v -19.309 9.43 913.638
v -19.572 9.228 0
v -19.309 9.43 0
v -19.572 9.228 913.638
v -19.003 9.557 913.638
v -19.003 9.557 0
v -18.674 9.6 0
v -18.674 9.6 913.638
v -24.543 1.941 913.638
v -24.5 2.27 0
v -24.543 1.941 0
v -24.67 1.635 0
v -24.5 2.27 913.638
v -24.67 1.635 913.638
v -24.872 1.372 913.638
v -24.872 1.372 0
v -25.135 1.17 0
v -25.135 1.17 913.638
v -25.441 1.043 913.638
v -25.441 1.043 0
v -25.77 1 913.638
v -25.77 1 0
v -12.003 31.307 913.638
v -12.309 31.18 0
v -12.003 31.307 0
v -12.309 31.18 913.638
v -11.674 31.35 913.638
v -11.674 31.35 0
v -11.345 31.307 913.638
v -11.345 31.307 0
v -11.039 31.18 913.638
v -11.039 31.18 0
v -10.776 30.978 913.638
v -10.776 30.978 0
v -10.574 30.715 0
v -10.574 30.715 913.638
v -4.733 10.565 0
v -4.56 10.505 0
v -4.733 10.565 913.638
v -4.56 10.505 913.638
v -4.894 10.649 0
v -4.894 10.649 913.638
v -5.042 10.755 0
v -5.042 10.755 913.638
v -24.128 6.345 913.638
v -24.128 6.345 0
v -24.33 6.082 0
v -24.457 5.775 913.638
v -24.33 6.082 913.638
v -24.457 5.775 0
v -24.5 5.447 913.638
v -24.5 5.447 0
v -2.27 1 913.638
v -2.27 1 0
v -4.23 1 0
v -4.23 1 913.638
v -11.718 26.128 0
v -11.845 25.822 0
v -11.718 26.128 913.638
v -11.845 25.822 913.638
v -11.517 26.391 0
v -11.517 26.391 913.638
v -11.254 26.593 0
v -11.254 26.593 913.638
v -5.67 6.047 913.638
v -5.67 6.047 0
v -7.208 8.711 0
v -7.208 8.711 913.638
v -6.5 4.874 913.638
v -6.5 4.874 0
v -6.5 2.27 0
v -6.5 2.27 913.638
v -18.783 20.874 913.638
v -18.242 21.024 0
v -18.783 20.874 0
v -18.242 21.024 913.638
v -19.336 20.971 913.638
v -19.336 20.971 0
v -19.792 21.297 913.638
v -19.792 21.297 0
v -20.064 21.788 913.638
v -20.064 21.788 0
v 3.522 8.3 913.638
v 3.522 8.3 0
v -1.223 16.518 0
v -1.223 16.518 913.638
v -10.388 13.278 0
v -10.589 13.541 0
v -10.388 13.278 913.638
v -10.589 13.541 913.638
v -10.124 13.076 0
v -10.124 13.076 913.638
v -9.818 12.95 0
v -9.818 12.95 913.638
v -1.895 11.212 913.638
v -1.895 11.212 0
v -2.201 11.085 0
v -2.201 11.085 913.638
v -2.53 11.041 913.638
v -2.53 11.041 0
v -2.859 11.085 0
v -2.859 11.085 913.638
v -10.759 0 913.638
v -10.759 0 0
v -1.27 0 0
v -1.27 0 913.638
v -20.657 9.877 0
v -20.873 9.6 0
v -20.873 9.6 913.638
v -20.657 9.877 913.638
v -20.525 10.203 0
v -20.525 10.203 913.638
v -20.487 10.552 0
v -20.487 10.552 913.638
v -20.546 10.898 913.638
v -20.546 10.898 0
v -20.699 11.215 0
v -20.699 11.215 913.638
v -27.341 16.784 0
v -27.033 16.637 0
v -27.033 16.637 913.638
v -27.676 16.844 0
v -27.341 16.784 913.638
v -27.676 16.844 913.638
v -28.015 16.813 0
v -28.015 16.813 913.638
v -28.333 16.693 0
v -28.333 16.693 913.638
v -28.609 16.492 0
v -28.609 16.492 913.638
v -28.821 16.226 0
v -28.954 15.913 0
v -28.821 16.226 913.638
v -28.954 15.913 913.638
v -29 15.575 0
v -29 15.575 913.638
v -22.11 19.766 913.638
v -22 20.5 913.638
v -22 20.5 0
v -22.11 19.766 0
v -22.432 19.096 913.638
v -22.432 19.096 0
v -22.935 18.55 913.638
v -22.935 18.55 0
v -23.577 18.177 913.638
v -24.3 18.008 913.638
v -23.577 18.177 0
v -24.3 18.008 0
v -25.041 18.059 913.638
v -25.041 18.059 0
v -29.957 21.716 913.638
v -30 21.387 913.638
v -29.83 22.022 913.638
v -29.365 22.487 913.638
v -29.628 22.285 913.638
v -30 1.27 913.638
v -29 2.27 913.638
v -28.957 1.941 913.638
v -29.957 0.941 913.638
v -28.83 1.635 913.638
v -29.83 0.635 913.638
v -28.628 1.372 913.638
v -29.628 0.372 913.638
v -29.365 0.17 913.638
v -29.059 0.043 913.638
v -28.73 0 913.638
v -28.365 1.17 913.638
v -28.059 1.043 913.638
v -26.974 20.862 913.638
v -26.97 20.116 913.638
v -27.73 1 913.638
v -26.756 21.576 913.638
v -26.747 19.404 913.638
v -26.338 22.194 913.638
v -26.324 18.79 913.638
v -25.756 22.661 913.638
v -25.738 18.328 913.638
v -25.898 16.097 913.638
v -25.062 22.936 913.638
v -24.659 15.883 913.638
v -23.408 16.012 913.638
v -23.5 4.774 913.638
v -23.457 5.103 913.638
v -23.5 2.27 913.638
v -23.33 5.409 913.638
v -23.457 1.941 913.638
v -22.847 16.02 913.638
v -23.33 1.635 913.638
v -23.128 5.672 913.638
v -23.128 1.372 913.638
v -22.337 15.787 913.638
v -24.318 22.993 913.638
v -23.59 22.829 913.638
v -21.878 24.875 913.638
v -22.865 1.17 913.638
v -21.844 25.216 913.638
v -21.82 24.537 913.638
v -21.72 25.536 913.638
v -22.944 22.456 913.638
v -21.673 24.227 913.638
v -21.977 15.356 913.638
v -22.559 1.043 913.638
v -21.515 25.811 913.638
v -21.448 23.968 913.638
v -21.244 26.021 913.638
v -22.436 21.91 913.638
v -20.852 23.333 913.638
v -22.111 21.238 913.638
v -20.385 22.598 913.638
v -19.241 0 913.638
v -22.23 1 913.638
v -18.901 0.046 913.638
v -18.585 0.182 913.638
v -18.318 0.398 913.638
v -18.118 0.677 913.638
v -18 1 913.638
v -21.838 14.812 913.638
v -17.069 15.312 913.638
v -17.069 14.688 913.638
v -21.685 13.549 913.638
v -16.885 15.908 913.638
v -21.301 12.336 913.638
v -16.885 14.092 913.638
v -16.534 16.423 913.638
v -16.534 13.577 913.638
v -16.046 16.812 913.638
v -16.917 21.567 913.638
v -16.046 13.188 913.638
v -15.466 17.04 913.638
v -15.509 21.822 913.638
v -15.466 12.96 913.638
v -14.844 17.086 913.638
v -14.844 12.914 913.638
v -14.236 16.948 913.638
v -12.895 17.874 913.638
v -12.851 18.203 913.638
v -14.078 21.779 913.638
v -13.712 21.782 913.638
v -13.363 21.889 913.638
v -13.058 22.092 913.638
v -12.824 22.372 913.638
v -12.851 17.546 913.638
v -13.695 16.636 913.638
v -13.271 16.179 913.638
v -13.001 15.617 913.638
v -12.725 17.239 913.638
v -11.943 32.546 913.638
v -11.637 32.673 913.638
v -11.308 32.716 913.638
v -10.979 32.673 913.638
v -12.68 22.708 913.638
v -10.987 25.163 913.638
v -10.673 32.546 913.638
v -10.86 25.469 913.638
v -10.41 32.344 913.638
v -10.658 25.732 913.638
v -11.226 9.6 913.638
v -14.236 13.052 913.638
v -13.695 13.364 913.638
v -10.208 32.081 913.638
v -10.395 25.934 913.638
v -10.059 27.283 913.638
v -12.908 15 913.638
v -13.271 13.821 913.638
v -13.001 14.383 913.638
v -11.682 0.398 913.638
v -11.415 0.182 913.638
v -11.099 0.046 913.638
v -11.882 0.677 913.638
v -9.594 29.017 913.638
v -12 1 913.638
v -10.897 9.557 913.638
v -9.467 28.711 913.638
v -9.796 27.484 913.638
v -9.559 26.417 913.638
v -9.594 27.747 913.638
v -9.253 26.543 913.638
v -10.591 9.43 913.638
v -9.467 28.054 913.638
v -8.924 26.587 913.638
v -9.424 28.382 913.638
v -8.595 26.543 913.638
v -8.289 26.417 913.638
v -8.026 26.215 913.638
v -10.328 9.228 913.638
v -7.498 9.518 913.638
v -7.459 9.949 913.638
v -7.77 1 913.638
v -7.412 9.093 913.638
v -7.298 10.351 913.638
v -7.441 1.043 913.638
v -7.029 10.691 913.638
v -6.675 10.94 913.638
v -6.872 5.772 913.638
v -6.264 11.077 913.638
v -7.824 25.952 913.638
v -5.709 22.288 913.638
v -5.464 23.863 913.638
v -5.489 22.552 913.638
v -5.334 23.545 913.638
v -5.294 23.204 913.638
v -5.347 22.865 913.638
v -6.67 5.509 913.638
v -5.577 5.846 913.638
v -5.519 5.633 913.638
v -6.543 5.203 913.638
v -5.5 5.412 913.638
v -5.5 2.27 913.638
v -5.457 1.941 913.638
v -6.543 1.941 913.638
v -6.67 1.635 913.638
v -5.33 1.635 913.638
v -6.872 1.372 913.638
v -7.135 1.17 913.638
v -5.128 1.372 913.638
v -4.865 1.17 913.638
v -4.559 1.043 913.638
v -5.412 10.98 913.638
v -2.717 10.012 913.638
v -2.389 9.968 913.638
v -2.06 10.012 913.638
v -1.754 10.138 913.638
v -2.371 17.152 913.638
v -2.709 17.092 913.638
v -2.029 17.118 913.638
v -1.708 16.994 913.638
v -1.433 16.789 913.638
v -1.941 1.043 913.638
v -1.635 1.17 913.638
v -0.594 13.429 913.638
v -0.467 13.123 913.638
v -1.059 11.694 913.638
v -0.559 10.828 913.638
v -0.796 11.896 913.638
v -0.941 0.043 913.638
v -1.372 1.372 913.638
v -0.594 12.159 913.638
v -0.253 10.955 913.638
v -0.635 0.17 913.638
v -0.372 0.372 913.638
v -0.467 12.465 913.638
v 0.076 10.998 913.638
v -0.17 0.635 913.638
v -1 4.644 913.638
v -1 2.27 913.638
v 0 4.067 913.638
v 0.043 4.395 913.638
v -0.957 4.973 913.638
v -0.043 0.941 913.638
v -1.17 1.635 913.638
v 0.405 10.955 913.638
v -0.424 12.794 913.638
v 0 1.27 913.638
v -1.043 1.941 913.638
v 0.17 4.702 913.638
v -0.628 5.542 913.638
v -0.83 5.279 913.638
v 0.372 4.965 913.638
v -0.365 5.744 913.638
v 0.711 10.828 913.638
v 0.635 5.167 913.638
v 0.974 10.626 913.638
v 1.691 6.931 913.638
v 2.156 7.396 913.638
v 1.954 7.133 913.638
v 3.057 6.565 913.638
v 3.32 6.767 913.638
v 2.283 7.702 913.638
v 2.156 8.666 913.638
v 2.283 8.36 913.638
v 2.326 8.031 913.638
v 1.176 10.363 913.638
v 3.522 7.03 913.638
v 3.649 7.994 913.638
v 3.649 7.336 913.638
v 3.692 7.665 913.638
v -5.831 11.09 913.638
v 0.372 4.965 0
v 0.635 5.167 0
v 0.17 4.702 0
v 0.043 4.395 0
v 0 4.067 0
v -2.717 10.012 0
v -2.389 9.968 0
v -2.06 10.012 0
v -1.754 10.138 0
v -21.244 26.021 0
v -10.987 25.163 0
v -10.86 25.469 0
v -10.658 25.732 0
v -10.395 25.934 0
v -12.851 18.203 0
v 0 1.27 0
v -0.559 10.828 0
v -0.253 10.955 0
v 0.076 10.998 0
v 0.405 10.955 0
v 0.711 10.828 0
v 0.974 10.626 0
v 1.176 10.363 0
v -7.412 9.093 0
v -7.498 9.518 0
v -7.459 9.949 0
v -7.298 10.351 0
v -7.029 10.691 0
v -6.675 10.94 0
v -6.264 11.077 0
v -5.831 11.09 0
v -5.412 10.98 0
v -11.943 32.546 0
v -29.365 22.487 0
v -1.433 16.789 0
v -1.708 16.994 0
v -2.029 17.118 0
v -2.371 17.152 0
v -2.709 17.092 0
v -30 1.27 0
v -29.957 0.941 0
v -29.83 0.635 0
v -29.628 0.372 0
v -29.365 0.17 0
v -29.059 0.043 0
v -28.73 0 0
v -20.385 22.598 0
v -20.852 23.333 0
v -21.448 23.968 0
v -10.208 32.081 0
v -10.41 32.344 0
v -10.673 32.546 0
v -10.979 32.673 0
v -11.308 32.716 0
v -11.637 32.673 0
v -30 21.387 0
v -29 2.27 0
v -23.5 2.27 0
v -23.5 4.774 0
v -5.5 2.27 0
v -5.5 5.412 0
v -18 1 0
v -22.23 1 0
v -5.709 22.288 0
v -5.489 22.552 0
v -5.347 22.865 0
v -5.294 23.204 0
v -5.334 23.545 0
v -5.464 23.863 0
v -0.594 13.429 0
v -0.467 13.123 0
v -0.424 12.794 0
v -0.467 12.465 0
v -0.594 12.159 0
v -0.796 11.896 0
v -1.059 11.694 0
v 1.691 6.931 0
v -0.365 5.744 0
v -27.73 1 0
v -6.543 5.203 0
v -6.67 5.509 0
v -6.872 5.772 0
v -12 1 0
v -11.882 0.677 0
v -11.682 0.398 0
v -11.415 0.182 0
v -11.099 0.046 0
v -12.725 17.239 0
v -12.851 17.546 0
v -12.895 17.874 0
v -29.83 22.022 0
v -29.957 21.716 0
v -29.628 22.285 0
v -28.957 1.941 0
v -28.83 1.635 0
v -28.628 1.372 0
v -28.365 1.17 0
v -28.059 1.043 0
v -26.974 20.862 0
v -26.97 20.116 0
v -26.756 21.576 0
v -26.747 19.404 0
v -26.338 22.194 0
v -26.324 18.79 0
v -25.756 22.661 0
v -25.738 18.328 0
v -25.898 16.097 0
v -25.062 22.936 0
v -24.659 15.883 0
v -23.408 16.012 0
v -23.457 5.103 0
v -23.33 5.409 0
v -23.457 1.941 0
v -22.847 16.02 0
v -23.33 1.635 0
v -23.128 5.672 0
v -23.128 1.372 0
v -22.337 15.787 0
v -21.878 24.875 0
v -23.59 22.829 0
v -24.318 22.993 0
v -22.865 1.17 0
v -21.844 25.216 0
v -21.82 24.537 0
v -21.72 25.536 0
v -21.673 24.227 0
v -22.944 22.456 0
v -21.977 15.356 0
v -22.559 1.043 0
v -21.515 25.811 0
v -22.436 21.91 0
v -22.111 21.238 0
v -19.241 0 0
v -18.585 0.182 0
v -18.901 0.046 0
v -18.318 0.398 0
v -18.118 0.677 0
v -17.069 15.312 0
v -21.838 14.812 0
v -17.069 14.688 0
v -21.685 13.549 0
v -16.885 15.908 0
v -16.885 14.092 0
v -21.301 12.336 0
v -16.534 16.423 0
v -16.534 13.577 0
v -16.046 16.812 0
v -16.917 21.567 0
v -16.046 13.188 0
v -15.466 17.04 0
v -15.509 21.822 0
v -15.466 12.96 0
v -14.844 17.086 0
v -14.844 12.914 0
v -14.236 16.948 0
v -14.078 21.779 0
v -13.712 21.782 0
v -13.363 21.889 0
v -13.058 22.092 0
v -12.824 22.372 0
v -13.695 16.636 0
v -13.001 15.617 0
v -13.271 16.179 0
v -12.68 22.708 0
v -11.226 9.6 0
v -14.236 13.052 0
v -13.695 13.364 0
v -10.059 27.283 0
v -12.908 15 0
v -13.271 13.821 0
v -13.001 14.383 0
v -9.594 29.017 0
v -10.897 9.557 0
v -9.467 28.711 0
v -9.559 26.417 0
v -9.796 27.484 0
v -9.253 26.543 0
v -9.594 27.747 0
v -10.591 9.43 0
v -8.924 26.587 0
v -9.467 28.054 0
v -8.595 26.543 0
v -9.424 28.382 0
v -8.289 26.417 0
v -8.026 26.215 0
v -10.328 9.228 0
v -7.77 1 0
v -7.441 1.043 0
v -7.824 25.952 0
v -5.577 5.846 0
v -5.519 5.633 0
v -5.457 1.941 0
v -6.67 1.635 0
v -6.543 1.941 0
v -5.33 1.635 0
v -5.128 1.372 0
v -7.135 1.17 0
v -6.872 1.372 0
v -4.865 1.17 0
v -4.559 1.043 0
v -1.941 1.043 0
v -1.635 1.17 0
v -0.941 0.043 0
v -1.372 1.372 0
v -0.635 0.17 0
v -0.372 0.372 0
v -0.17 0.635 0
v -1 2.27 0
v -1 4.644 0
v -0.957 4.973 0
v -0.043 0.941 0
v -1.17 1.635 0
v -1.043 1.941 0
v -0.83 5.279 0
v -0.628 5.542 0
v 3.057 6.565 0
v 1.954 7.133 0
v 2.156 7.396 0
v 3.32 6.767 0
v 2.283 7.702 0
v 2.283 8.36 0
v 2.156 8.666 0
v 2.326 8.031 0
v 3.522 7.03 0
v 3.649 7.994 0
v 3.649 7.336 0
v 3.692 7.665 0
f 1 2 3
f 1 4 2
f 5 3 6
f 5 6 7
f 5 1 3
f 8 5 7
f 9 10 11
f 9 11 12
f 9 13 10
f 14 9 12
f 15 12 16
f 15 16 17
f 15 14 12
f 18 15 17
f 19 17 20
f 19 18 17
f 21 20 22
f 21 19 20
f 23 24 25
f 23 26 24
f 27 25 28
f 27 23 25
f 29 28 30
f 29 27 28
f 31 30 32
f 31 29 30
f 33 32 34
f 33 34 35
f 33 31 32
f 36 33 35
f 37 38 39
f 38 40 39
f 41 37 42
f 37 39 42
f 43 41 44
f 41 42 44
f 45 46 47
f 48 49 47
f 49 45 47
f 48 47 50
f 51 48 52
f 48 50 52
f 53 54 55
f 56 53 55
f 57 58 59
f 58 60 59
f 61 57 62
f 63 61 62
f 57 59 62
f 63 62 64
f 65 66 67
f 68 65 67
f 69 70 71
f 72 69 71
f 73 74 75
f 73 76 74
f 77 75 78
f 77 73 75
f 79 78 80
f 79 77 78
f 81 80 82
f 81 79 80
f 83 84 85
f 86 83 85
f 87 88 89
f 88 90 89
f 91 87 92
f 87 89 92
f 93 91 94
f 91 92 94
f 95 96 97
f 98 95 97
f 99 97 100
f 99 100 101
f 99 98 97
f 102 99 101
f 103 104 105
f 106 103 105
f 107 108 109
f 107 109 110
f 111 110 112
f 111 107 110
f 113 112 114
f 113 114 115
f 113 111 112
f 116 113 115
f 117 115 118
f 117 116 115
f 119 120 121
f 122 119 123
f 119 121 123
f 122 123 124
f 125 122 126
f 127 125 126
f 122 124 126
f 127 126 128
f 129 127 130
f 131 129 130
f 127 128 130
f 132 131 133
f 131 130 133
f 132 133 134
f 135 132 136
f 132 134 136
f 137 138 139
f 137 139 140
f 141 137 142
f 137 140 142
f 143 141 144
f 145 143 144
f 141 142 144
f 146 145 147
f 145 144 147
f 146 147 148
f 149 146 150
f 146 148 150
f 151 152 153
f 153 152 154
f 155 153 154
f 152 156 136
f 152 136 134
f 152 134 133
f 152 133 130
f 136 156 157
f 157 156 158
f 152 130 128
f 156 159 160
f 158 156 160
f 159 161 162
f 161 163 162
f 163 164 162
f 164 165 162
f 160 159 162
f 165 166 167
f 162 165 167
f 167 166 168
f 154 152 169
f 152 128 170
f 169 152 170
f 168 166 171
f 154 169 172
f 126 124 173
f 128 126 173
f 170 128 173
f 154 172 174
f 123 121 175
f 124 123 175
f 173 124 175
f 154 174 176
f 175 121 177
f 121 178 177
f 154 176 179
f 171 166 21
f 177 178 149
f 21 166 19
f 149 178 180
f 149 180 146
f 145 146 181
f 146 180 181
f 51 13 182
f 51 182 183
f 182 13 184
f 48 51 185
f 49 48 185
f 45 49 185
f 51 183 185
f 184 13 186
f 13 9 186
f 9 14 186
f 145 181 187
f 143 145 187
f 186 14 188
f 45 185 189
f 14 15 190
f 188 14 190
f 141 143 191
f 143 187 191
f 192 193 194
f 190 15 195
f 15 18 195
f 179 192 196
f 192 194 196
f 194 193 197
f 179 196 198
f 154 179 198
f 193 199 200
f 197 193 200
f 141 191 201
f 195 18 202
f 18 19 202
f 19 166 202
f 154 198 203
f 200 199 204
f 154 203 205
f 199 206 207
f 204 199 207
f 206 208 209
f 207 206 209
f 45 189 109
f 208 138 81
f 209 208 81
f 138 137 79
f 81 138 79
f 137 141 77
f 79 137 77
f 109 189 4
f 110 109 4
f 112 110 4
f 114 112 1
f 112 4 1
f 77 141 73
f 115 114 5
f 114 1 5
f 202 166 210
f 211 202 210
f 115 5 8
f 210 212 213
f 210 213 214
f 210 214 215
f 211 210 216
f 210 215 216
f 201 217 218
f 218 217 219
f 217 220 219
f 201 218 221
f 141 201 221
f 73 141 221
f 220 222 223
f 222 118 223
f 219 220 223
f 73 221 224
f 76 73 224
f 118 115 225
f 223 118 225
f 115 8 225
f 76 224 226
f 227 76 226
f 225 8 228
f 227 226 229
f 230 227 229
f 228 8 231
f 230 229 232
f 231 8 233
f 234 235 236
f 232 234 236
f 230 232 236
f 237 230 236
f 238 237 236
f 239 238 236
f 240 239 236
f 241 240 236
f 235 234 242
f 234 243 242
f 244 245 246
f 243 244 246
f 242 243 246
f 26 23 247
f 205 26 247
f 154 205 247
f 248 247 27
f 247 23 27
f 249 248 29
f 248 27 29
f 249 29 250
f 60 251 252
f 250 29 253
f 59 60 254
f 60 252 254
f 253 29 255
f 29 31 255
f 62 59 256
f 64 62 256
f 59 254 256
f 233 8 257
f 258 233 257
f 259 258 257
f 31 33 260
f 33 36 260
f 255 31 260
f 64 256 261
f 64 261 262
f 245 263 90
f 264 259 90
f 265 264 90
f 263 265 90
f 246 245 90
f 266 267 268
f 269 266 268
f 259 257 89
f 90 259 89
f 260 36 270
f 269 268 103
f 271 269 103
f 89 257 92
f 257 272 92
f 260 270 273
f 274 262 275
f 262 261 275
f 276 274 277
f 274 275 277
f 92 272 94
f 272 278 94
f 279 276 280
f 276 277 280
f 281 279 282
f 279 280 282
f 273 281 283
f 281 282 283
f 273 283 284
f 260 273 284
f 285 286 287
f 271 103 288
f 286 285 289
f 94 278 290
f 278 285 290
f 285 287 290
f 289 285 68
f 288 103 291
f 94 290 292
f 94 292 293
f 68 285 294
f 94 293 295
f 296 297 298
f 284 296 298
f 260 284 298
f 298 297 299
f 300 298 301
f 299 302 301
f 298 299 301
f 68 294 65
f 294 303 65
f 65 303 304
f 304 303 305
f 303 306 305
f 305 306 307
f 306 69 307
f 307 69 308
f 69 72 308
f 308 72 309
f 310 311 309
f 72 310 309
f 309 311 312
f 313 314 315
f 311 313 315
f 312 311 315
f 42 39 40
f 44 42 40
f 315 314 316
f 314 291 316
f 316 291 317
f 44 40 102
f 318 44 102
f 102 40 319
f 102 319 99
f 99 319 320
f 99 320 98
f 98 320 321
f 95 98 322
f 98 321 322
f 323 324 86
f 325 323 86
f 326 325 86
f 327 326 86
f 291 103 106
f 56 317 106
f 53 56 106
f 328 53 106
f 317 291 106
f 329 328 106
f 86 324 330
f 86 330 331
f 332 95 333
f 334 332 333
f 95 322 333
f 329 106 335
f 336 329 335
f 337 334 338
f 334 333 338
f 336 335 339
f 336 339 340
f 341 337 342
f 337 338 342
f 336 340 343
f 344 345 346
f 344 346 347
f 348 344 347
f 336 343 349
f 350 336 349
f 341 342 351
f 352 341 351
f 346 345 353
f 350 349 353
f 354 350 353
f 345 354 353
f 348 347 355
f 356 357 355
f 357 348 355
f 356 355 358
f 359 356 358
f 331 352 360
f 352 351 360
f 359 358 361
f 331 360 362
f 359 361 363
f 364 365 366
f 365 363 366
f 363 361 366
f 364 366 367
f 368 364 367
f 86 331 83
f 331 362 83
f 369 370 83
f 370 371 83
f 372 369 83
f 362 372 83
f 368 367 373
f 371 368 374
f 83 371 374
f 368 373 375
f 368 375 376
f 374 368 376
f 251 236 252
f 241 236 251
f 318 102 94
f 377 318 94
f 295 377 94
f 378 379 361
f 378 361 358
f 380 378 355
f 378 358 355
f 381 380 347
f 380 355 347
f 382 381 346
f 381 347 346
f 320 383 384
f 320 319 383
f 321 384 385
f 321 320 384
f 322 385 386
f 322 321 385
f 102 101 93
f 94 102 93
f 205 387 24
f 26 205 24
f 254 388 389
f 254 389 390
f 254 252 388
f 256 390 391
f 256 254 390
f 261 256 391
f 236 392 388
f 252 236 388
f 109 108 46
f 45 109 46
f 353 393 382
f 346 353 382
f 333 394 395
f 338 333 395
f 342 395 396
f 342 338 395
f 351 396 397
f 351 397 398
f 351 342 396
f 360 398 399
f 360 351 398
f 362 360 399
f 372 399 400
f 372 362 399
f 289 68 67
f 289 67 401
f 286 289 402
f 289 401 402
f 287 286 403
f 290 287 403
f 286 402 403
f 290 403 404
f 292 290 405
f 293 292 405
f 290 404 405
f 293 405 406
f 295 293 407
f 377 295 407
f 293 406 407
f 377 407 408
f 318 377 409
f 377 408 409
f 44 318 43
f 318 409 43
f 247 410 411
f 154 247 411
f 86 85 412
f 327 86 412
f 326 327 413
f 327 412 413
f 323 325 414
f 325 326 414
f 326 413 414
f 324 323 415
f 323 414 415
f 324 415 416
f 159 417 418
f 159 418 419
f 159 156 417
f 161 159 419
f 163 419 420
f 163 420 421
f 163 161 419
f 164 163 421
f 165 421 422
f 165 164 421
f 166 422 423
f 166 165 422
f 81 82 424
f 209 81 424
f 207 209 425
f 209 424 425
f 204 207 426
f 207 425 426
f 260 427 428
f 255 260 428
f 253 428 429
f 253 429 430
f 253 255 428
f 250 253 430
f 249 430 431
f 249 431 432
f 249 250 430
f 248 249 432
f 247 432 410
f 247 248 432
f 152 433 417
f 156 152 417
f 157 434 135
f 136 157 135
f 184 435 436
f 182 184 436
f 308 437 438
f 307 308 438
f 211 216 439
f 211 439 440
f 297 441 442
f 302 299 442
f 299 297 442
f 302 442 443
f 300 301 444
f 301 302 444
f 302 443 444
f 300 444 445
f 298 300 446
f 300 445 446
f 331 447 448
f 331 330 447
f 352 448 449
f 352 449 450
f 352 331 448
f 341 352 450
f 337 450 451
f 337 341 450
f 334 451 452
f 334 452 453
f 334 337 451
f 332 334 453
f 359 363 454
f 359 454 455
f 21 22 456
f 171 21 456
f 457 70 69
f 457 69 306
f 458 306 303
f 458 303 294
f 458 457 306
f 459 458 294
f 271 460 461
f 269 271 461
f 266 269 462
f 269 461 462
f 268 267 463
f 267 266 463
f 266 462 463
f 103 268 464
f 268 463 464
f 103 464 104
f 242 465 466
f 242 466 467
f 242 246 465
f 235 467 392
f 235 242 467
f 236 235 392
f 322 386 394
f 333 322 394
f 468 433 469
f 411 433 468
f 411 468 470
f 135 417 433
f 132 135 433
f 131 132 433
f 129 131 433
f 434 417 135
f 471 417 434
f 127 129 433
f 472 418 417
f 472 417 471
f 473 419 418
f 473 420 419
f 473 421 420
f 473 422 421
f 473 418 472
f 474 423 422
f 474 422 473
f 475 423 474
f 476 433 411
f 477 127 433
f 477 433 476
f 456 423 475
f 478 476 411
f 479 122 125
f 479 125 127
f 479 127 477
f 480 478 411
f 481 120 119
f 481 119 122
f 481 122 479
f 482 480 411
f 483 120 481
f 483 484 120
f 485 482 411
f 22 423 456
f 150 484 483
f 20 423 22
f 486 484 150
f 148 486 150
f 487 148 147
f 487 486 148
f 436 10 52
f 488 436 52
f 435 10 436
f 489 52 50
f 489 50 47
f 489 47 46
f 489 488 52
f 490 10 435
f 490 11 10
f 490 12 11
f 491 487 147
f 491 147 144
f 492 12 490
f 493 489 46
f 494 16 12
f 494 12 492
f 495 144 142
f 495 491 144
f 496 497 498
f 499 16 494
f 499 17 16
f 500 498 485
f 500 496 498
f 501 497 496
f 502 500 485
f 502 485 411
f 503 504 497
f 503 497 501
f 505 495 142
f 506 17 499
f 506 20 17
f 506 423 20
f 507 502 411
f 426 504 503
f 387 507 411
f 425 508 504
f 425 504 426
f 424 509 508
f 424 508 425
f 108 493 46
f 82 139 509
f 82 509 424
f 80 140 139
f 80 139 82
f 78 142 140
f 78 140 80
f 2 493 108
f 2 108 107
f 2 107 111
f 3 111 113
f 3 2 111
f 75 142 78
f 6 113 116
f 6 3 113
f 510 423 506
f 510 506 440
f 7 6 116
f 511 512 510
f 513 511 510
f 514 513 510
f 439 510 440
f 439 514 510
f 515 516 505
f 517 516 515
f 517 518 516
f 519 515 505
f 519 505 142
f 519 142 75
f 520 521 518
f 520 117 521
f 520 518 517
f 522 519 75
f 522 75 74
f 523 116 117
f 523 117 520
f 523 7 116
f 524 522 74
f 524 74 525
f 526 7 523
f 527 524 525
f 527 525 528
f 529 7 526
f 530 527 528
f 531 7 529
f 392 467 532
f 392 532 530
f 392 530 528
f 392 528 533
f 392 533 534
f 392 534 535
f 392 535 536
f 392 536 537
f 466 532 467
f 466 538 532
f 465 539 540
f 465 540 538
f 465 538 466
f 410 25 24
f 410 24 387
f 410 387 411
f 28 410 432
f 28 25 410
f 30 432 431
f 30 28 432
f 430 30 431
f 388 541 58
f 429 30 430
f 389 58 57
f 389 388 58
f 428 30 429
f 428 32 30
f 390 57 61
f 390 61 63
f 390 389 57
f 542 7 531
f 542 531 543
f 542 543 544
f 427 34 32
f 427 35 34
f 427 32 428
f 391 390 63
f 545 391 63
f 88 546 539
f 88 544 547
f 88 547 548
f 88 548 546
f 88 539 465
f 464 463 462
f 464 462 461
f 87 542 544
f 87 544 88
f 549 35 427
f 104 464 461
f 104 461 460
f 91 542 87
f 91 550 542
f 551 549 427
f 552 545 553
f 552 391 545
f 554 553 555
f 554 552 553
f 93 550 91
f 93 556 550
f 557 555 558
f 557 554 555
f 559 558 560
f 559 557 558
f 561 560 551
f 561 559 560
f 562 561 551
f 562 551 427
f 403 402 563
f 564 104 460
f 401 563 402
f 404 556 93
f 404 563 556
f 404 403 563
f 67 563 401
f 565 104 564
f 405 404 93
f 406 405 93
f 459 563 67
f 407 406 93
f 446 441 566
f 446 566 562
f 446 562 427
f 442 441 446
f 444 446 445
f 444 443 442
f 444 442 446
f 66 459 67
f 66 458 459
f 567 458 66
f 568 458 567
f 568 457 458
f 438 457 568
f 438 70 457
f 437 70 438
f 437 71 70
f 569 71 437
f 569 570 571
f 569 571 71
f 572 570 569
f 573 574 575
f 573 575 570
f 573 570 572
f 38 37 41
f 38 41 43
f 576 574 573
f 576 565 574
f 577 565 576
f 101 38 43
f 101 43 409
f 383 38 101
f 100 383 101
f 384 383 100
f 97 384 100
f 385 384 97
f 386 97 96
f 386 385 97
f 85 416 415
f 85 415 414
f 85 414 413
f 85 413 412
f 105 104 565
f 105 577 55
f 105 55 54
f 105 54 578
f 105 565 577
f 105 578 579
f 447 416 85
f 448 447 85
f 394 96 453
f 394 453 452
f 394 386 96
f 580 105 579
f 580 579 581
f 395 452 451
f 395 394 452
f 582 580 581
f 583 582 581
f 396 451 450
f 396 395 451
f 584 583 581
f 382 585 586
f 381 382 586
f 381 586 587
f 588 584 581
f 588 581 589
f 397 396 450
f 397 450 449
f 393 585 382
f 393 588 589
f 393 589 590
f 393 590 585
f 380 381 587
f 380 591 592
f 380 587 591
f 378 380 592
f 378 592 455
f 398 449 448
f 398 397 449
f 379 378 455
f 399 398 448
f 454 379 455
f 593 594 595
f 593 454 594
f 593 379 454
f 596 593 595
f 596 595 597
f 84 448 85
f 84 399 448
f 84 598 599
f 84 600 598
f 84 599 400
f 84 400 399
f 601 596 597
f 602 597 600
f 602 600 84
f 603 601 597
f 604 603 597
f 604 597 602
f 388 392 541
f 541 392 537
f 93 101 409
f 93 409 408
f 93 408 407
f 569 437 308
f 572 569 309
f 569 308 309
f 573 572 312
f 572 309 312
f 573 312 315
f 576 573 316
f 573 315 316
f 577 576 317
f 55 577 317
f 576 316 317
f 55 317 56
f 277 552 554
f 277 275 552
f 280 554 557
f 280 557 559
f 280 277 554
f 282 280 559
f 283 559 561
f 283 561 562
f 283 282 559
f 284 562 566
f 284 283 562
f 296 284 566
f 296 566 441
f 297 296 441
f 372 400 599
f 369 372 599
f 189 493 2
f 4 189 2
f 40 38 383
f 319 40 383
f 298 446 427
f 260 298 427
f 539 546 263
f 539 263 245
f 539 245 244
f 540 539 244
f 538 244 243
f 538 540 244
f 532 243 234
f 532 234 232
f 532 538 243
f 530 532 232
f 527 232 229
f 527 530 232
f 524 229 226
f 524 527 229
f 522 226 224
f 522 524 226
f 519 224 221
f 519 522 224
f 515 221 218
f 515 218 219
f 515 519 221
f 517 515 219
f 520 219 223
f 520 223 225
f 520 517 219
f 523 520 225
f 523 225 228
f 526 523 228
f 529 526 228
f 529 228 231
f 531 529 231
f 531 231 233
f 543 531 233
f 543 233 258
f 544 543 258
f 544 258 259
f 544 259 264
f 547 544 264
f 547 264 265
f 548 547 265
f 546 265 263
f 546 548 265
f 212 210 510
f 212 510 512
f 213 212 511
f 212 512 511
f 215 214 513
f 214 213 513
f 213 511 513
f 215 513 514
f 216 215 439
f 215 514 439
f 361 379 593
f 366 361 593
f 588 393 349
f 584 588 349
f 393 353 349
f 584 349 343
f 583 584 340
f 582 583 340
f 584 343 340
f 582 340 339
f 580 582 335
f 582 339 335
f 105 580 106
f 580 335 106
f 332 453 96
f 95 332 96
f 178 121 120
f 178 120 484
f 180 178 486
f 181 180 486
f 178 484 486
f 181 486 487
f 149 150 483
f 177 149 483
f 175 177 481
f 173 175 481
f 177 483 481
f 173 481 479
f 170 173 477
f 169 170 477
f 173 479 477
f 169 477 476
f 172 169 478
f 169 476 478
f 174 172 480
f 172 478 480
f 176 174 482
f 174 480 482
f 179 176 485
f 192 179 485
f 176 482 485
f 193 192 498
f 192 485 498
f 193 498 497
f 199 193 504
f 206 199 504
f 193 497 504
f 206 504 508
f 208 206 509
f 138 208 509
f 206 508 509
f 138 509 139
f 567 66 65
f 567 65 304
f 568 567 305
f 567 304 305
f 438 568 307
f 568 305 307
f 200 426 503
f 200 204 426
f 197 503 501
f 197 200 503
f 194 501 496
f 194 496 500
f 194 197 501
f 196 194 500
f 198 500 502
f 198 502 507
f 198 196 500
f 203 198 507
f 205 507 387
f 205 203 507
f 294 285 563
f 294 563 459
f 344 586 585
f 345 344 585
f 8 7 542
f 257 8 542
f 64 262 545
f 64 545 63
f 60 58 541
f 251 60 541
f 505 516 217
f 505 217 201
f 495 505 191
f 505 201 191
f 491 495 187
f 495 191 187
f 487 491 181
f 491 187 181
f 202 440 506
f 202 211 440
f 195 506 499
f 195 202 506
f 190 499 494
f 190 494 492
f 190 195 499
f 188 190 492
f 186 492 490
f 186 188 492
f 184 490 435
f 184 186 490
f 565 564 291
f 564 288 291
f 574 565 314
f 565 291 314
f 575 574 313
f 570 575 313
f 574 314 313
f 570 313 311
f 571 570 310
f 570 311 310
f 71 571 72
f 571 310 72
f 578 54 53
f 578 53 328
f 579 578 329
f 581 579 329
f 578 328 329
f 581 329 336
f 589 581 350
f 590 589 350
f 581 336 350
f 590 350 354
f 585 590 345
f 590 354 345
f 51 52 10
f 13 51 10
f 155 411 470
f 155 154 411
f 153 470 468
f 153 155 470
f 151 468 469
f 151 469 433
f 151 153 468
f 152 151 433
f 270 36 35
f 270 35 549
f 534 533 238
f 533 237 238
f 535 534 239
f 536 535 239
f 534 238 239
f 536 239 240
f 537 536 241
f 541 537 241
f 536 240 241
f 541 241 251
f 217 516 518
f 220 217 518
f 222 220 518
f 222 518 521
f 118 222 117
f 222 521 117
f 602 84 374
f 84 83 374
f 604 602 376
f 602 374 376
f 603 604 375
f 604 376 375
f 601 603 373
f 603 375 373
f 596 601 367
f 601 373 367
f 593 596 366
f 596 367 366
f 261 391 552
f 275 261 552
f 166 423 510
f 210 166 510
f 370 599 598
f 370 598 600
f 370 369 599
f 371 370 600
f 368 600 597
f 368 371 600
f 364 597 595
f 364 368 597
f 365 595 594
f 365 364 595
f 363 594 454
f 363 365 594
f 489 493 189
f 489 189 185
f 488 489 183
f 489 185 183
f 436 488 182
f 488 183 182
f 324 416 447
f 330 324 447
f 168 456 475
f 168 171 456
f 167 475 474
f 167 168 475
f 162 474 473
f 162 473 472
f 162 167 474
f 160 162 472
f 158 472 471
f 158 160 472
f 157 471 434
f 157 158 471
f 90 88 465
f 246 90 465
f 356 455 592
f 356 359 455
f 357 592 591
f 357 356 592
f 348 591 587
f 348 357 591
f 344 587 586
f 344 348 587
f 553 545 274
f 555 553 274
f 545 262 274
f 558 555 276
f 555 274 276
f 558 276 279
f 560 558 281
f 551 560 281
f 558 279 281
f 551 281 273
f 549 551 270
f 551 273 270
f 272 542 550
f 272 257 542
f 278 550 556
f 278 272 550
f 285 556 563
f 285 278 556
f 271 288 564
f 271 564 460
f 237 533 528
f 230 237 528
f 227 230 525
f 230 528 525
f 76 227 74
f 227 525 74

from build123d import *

# Parameters (mm, degrees)
SKETCH1_R           = 2.092304845
BOSS_EXTRUDE1_DEPTH = 913.638
FILLET1_R           = 1.27
FILLET2_R           = 1.27
FILLET3_R           = 1.27
FILLET4_R           = 1.27
FILLET5_R           = 1.27
FILLET6_R           = 1.27
FILLET7_R           = 1.27
FILLET8_R           = 1.27
FILLET9_R           = 1.27
FILLET10_R          = 1.27
FILLET11_R          = 1.27
FILLET12_R          = 1.27


with BuildPart() as part:
    # Sketch1 → Boss-Extrude1 (new body)
    with BuildSketch(Plane.XY):
        Polygon((-5.709111752, 22.288452484), (-4.843086348, 22.788452484), (-10.843086348, 33.180757329), (-30.000008327, 22.120503268), (-30.000008327, 0), (-18.0000002, 0), (-18.0000002, 1), (-23.500000006, 1), (-23.500000006, 5.300000062), (-19.200000068, 9.6), (-10.7, 9.6), (-6.5, 5.4), (-6.5, 1), (-11.999999876, 1), (-11.999999876, 0), (0, 0), (0, 4.8), (4.156920206, 7.199999), (-1.843078924, 17.592302339), (-2.709103466, 17.092304845), (0.040888209, 12.329160408), (-2.350417658, 10.948553557), (-10.326319052, 13.085689909), (-12.987541577, 17.695062532), (-10.850405232, 25.670963952), (-8.459105552, 27.051581466), align=None)
        with BuildLine():
            Line((-24.500008532, 1), (-29.00000835, 1))
            Line((-29.00000835, 1), (-29.00000835, 19.456837393))
            ThreePointArc((-29.00000835, 19.456837393), (-26.689110252, 16.43231636), (-22.891878185, 16.169626182))
            ThreePointArc((-22.891878185, 16.169626182), (-22.194595414, 16.497090044), (-21.561428455, 16.935878658))
            ThreePointArc((-21.561428455, 16.935878658), (-21.66355866, 13.451778233), (-20.035811579, 10.369599493))
            Line((-20.035811579, 10.369599493), (-20.872797194, 9.599995438))
            Line((-20.872797194, 9.599995438), (-24.500008532, 5.9727841))
            Line((-24.500008532, 5.9727841), (-24.500008532, 1))
        make_face(mode=Mode.SUBTRACT)
        with Locations((-15.000008327, 14.999995205)):
            Circle(SKETCH1_R, mode=Mode.SUBTRACT)
        with BuildLine():
            Line((-2.209115566, 9.875409102), (0.540892748, 11.463127143))
            Line((0.540892748, 11.463127143), (2.790879962, 7.566015836))
            Line((2.790879962, 7.566015836), (-1, 5.377350269))
            Line((-1, 5.377350269), (-1, 1))
            Line((-1, 1), (-5.5, 1))
            Line((-5.5, 1), (-5.5, 5.752344548))
            Line((-5.5, 5.752344548), (-7.208180578, 8.711011985))
            ThreePointArc((-7.208180578, 8.711011985), (-6.939845297, 10.769055524), (-4.872208764, 10.588982774))
            Line((-4.872208764, 10.588982774), (-2.209115566, 9.875409102))
        make_face(mode=Mode.SUBTRACT)
        with BuildLine():
            ThreePointArc((-25.041331703, 18.059304934), (-26.0647274, 22.449778327), (-22.000008327, 20.499995205))
            ThreePointArc((-22.000008327, 20.499995205), (-22.935289253, 18.550212084), (-25.041331703, 18.059304934))
        make_face(mode=Mode.SUBTRACT)
        with BuildLine():
            Line((-11.209111752, 31.814731926), (-8.959116197, 27.917625308))
            Line((-8.959116197, 27.917625308), (-11.709116867, 26.329911808))
            Line((-11.709116867, 26.329911808), (-12.992600022, 21.539887463))
            ThreePointArc((-12.992600022, 21.539887463), (-16.72657734, 21.619575123), (-19.945942173, 19.726264054))
            ThreePointArc((-19.945942173, 19.726264054), (-20.570023631, 22.927627533), (-23.153409445, 24.918688437))
            Line((-23.153409445, 24.918688437), (-11.209111752, 31.814731926))
        make_face(mode=Mode.SUBTRACT)
    extrude(amount=BOSS_EXTRUDE1_DEPTH)

    # Fillet1
    fillet1_edges = [part.edges().sort_by_distance(p)[0] for p in [
        (-11.709116867, 26.329911808, 456.819),
        (-11.209111752, 31.814731926, 456.819),
        (4.156920206, 7.199999, 456.819),
        (0, 0, 456.819),
        (-10.7, 9.6, 456.819),
        (-19.200000068, 9.6, 456.819),
        (-30.000008327, 0, 456.819),
        (-30.000008327, 22.120503268, 456.819),
        (-2.209115566, 9.875409102, 456.819),
    ]]
    fillet(fillet1_edges, radius=FILLET1_R)

    # Fillet2
    # the kernel refuses this fillet: 1.27 mm, written as the material it adds along each edge
    with BuildSketch(Plane(origin=(-6.5, 5.4, 0), x_dir=(-0.7071067811865475, 0.7071067811865475, 0), z_dir=(0, 0, 1))) as fillet2_piece_1:
        with BuildLine():
            CenterArc((FILLET2_R * 0.414213562373, FILLET2_R), FILLET2_R, 225, 45)
            Line((-FILLET2_R * 0.292893218813, FILLET2_R * 0.292893218813), (-FILLET2_R * 0.307035354437, FILLET2_R * 0.27875108319))
            Line((-FILLET2_R * 0.307035354437, FILLET2_R * 0.27875108319), (-FILLET2_R * 0.00828427124746, -FILLET2_R * 0.02))
            Line((-FILLET2_R * 0.00828427124746, -FILLET2_R * 0.02), (FILLET2_R * 0.414213562373, -FILLET2_R * 0.02))
            Line((FILLET2_R * 0.414213562373, -FILLET2_R * 0.02), (FILLET2_R * 0.414213562373, 0))
        make_face()
    extrude(amount=913.638)
    # the kernel refuses this fillet: 1.27 mm, written as the material it adds along each edge
    with BuildSketch(Plane(origin=(-20.035811579, 10.369599493, 0), x_dir=(-0.736116223784905, -0.6768551581251718, 0), z_dir=(0, 0, 1))) as fillet2_2_piece_1:
        with BuildLine():
            CenterArc((1.170024806, -1.269571301), FILLET2_R, 91.488758863, 79.506059356)
            Line((-0.084321413, -1.070786087), (-0.109408338, -1.066810383))
            ThreePointArc((-0.109408338, -1.066810383), (-0.046434543, -0.535056491), (-0.0254, 0))
            Line((-0.0254, 0), (0, 0.0254))
            ThreePointArc((0, 0.0254), (0.568514582, 0.0254), (1.136369252, 0.025391426))
            Line((1.136369252, 0.025391426), (1.137029165, 0))
        make_face()
    extrude(amount=913.638)
    # the kernel refuses this fillet: 1.27 mm, written as the material it takes off along each edge
    with BuildSketch(Plane(origin=(-24.500008532, 5.9727841, -1.315128061), x_dir=(0, -1, 0), z_dir=(0, 0, 1))) as fillet2_3_piece_1:
        with BuildLine():
            CenterArc((FILLET2_R * 0.414213562373, FILLET2_R), FILLET2_R, 225, 45)
            Line((-FILLET2_R * 0.292893218813, FILLET2_R * 0.292893218813), (-FILLET2_R * 0.307035354437, FILLET2_R * 0.27875108319))
            Line((-FILLET2_R * 0.307035354437, FILLET2_R * 0.27875108319), (-FILLET2_R * 0.00828427124746, -FILLET2_R * 0.02))
            Line((-FILLET2_R * 0.00828427124746, -FILLET2_R * 0.02), (FILLET2_R * 0.414213562373, -FILLET2_R * 0.02))
            Line((FILLET2_R * 0.414213562373, -FILLET2_R * 0.02), (FILLET2_R * 0.414213562373, 0))
        make_face()
    extrude(amount=916.268256121, mode=Mode.SUBTRACT)

    # Fillet3
    fillet3_edges = [part.edges().sort_by_distance(p)[0] for p in [
        (-23.500000006, 5.300000062, 456.819),
        (-10.850405232, 25.670963952, 456.819),
        (-12.987541577, 17.695062532, 456.819),
    ]]
    fillet(fillet3_edges, radius=FILLET3_R)

    # Fillet4
    fillet4_edges = [part.edges().sort_by_distance(p)[0] for p in [
        (-10.326319052, 13.085689909, 456.819),
        (-2.350417658, 10.948553557, 456.819),
    ]]
    fillet(fillet4_edges, radius=FILLET4_R)

    # Fillet5
    fillet5_edges = [part.edges().sort_by_distance(p)[0] for p in [
        (2.790879962, 7.566015836, 456.819),
        (0.540892748, 11.463127143, 456.819),
        (-1, 5.377350269, 456.819),
        (-4.872208764, 10.588982774, 456.819),
    ]]
    fillet(fillet5_edges, radius=FILLET5_R)

    # Fillet6
    fillet6_edges = [part.edges().sort_by_distance(p)[0] for p in [
        (-29.00000835, 1, 456.819),
        (-24.500008532, 1, 456.819),
        (-6.5, 1, 456.819),
        (-23.500000006, 1, 456.819),
        (-5.5, 5.752344548, 456.819),
        (-5.5, 1, 456.819),
        (-1, 1, 456.819),
    ]]
    fillet(fillet6_edges, radius=FILLET6_R)

    # Fillet7
    fillet7_edges = [part.edges().sort_by_distance(p)[0] for p in [
        (-8.959116197, 27.917625308, 456.819),
        (-19.945942173, 19.726264054, 456.819),
        (-12.992600022, 21.539887463, 456.819),
        (-21.561428455, 16.935878658, 456.819),
        (0.040888209, 12.329160408, 456.819),
        (-8.459105552, 27.051581466, 456.819),
    ]]
    fillet(fillet7_edges, radius=FILLET7_R)

    # Fillet8
    fillet8_edges = [part.edges().sort_by_distance(p)[0] for p in [
        (-23.153409445, 24.918688437, 456.819),
        (0, 4.8, 456.819),
    ]]
    fillet(fillet8_edges, radius=FILLET8_R)

    # Fillet9
    fillet9_edges = [part.edges().sort_by_distance(p)[0] for p in [
        (-29.00000835, 19.456837393, 456.819),
    ]]
    fillet(fillet9_edges, radius=FILLET9_R)

    # Fillet10
    # the kernel refuses this fillet: 1.27 mm, written as the material it takes off along each edge
    with BuildSketch(Plane(origin=(-11.999999876, 0, -3.102418412), x_dir=(1, 0, 0), z_dir=(0, 0, 1))) as fillet10_piece_1:
        with BuildLine():
            CenterArc((1.240967365, 1.27), FILLET10_R, 192.274670215, 77.725329785)
            Line((0, 1), (-0.024819347, 0.9946))
            ThreePointArc((-0.024819347, 0.9946), (-0.0254, 0.5), (-0.0254, 0))
            Line((-0.0254, 0), (0, -0.0254))
            Line((0, -0.0254), (1.240967365, -0.0254))
            Line((1.240967365, -0.0254), (1.240967365, 0))
        make_face()
    extrude(amount=919.842836823, mode=Mode.SUBTRACT)
    with BuildSketch(Plane(origin=(-18.0000002, 0, -3.102418412), x_dir=(-3.741007503773801e-12, 1.0, 0), z_dir=(0, 0, 1))) as fillet10_piece_2:
        with BuildLine():
            CenterArc((1.27, 1.240967365), FILLET10_R, 180, 77.725329785)
            Line((0, 1.240967365), (-0.0254, 1.240967365))
            Line((-0.0254, 1.240967365), (-0.0254, 0))
            Line((-0.0254, 0), (0, -0.0254))
            ThreePointArc((0, -0.0254), (0.5, -0.0254), (0.9946, -0.024819347))
            Line((0.9946, -0.024819347), (1, 0))
        make_face()
    extrude(amount=919.842836823, mode=Mode.SUBTRACT)

    # Fillet11
    # the kernel refuses this fillet: 1.27 mm, written as the material it takes off along each edge
    with BuildSketch(Plane(origin=(-4.843086348, 22.788452484, -3.102418412), x_dir=(-0.8660254037863125, -0.49999999999675426, 0), z_dir=(0, 0, 1))) as fillet11_piece_1:
        with BuildLine():
            CenterArc((1.27, -1.240967365), FILLET11_R, 102.274670215, 77.725329785)
            Line((0, -1.240967365), (-0.0254, -1.240967365))
            Line((-0.0254, -1.240967365), (-0.0254, 0))
            Line((-0.0254, 0), (0, 0.0254))
            ThreePointArc((0, 0.0254), (0.5, 0.0254), (0.9946, 0.024819347))
            Line((0.9946, 0.024819347), (1, 0))
        make_face()
    extrude(amount=919.842836823, mode=Mode.SUBTRACT)
    with BuildSketch(Plane(origin=(-1.843078924, 17.592302339, -3.102412974), x_dir=(0.499999999999999, -0.8660254037844393, 0), z_dir=(0, 0, 1))) as fillet11_piece_2:
        with BuildLine():
            CenterArc((1.24096519, -1.27), FILLET11_R, 90, 77.725237445)
            Line((-1.74e-06, -0.999998), (-0.024821078, -0.99459796))
            ThreePointArc((-0.024821078, -0.99459796), (-0.02540087, -0.499998956), (-0.0254, 4.4e-08))
            Line((-0.0254, 4.4e-08), (0, 0.0254))
            Line((0, 0.0254), (1.24096519, 0.0254))
            Line((1.24096519, 0.0254), (1.24096519, 0))
        make_face()
    extrude(amount=919.842825949, mode=Mode.SUBTRACT)

    # Fillet12
    fillet12_edges = [part.edges().sort_by_distance(p)[0] for p in [
        (-10.843086348, 33.180757329, 456.819),
    ]]
    fillet(fillet12_edges, radius=FILLET12_R)


solid = part.part
